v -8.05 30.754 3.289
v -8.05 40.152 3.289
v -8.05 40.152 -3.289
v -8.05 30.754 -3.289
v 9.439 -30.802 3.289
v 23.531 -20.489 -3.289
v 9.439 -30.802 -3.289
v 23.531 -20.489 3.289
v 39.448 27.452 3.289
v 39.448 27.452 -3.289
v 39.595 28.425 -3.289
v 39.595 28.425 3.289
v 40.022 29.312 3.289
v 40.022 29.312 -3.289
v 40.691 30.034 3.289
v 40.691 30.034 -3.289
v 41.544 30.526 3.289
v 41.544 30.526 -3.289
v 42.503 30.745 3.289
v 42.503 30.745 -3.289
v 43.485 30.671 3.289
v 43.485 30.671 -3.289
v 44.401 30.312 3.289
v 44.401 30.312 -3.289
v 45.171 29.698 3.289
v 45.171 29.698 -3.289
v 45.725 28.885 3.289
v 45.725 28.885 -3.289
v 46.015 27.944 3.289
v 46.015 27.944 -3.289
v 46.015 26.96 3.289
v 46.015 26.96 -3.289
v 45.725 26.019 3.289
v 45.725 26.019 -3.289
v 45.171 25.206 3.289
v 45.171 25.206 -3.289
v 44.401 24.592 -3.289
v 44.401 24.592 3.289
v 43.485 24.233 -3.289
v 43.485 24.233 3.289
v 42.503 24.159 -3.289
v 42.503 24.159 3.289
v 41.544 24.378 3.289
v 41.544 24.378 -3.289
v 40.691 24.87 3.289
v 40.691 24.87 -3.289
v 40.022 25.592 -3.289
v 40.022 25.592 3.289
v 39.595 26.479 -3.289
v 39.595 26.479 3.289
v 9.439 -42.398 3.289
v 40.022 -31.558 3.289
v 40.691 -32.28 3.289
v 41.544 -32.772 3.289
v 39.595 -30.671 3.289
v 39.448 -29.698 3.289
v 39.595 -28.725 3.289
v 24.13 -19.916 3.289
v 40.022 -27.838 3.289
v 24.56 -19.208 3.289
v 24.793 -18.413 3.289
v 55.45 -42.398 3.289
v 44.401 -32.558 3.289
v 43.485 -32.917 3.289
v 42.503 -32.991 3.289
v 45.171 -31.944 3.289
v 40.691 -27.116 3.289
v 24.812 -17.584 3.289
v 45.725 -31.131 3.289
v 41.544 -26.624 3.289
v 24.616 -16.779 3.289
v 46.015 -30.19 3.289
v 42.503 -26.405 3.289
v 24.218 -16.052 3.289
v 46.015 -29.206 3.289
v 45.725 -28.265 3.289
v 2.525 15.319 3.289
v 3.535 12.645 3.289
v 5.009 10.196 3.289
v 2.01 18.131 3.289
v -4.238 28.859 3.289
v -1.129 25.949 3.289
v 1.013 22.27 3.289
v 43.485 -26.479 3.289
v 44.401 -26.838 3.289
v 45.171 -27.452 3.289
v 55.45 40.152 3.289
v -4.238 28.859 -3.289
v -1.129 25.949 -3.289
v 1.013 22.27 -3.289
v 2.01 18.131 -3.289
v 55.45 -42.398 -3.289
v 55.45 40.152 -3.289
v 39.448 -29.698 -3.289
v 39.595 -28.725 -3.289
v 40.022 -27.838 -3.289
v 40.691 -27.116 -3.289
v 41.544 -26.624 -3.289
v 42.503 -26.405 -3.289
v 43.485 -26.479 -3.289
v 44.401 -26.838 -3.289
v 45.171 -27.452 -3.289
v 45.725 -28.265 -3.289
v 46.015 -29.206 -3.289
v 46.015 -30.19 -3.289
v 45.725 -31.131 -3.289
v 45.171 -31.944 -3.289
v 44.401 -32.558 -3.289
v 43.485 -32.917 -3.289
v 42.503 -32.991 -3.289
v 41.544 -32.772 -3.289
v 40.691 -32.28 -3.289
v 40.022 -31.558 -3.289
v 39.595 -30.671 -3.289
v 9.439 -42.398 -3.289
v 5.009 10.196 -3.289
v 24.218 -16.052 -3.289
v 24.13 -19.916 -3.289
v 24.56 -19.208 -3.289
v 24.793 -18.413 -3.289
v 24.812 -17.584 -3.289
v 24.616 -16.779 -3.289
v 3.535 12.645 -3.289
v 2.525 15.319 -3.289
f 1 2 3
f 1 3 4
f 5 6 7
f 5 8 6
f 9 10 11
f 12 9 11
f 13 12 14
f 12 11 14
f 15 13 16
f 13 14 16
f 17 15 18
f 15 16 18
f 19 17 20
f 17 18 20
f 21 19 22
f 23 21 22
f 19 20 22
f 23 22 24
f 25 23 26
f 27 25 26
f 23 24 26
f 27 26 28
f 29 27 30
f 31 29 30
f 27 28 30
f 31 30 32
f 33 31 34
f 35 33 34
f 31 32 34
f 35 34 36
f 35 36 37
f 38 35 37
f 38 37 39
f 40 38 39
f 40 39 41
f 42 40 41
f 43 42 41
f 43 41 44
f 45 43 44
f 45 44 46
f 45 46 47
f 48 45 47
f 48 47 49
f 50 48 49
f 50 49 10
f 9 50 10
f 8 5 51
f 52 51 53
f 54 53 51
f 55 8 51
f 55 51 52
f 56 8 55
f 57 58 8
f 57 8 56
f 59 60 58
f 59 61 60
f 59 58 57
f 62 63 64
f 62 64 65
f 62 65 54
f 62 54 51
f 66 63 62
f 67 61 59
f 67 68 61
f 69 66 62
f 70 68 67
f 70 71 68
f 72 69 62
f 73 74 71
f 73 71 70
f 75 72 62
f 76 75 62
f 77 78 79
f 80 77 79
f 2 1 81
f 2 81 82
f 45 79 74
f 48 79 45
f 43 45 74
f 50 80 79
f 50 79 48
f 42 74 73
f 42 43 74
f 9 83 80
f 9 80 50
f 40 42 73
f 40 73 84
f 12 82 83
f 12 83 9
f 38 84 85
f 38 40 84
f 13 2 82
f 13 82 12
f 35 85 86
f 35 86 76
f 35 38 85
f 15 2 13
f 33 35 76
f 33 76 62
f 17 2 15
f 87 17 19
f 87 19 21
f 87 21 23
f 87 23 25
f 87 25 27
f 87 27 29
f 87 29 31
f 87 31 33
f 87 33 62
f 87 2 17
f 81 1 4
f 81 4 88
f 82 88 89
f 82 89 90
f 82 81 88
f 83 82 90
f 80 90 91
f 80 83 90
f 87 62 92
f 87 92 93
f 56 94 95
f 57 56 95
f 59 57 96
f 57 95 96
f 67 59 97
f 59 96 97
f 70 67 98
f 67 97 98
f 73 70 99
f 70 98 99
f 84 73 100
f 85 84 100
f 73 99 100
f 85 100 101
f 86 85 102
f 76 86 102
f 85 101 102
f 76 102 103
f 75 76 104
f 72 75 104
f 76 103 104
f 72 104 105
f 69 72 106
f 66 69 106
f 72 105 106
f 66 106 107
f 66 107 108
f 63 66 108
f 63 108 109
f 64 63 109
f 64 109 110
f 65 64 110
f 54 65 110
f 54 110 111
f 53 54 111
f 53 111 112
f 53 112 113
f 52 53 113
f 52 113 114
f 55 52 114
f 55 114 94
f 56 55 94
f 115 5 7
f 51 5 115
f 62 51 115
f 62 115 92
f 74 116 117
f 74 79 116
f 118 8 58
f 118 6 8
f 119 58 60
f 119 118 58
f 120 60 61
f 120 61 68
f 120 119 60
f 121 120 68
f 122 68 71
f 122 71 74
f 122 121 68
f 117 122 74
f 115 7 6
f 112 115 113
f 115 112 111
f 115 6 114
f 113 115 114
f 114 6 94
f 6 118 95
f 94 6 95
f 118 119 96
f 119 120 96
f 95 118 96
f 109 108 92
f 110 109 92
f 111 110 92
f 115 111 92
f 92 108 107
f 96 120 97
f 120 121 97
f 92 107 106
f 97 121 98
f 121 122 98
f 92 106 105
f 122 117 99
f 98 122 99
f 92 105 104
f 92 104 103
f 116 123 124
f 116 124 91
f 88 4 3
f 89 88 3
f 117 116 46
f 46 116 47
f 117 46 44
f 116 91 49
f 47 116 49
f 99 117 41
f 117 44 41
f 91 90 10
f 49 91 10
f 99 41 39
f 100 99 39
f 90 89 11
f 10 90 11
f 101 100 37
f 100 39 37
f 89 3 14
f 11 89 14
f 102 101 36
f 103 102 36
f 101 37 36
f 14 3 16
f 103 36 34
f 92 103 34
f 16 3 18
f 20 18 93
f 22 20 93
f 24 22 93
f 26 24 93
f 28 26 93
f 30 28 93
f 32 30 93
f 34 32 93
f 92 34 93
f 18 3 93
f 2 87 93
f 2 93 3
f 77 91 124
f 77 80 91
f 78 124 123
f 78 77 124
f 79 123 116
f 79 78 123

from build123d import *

# Parameters (mm, degrees)
BOSS_EXTRUDE1_DEPTH        = 3.2893
FILLET1_R                  = 3.175
F_97_0_26_DIAMETER_HOLE1_D = 6.604


with BuildPart() as part:
    # Sketch1 → Boss-Extrude1 (new, symmetric)
    with BuildSketch(Plane.XY):
        with BuildLine():
            Line((26.092747392, -18.613926775), (9.438661748, -30.801947025))
            Line((9.438661748, -30.801947025), (9.438661748, -42.398036845))
            Line((9.438661748, -42.398036845), (55.450257601, -42.398036845))
            Line((55.450257601, -42.398036845), (55.450257601, 40.151963155))
            Line((55.450257601, 40.151963155), (-8.049742399, 40.151963155))
            Line((-8.049742399, 40.151963155), (-8.049742399, 30.753963155))
            ThreePointArc((-8.049742399, 30.753963155), (-1.129436116, 25.949070048), (2.010067235, 18.131068031))
            ThreePointArc((2.010067235, 18.131068031), (2.969578149, 13.959464366), (5.008768553, 10.19587023))
            Line((5.008768553, 10.19587023), (26.092747392, -18.613926775))
        make_face()
    extrude(amount=BOSS_EXTRUDE1_DEPTH, both=True)

    # Fillet1
    fillet1_edges = [part.edges().sort_by_distance(p)[0] for p in [
        (26.092747392, -18.613926775, 0),
    ]]
    fillet(fillet1_edges, radius=FILLET1_R)

    # #97 (0.26) Diameter Hole1 (through all)
    with Locations(Plane(origin=(42.750257601, 27.451963155, 3.2893), x_dir=(1, 0, 0), z_dir=(0, 0, 1))):
        with Locations((0, 0), (0, -57.15)):
            Hole(F_97_0_26_DIAMETER_HOLE1_D / 2)


solid = part.part
